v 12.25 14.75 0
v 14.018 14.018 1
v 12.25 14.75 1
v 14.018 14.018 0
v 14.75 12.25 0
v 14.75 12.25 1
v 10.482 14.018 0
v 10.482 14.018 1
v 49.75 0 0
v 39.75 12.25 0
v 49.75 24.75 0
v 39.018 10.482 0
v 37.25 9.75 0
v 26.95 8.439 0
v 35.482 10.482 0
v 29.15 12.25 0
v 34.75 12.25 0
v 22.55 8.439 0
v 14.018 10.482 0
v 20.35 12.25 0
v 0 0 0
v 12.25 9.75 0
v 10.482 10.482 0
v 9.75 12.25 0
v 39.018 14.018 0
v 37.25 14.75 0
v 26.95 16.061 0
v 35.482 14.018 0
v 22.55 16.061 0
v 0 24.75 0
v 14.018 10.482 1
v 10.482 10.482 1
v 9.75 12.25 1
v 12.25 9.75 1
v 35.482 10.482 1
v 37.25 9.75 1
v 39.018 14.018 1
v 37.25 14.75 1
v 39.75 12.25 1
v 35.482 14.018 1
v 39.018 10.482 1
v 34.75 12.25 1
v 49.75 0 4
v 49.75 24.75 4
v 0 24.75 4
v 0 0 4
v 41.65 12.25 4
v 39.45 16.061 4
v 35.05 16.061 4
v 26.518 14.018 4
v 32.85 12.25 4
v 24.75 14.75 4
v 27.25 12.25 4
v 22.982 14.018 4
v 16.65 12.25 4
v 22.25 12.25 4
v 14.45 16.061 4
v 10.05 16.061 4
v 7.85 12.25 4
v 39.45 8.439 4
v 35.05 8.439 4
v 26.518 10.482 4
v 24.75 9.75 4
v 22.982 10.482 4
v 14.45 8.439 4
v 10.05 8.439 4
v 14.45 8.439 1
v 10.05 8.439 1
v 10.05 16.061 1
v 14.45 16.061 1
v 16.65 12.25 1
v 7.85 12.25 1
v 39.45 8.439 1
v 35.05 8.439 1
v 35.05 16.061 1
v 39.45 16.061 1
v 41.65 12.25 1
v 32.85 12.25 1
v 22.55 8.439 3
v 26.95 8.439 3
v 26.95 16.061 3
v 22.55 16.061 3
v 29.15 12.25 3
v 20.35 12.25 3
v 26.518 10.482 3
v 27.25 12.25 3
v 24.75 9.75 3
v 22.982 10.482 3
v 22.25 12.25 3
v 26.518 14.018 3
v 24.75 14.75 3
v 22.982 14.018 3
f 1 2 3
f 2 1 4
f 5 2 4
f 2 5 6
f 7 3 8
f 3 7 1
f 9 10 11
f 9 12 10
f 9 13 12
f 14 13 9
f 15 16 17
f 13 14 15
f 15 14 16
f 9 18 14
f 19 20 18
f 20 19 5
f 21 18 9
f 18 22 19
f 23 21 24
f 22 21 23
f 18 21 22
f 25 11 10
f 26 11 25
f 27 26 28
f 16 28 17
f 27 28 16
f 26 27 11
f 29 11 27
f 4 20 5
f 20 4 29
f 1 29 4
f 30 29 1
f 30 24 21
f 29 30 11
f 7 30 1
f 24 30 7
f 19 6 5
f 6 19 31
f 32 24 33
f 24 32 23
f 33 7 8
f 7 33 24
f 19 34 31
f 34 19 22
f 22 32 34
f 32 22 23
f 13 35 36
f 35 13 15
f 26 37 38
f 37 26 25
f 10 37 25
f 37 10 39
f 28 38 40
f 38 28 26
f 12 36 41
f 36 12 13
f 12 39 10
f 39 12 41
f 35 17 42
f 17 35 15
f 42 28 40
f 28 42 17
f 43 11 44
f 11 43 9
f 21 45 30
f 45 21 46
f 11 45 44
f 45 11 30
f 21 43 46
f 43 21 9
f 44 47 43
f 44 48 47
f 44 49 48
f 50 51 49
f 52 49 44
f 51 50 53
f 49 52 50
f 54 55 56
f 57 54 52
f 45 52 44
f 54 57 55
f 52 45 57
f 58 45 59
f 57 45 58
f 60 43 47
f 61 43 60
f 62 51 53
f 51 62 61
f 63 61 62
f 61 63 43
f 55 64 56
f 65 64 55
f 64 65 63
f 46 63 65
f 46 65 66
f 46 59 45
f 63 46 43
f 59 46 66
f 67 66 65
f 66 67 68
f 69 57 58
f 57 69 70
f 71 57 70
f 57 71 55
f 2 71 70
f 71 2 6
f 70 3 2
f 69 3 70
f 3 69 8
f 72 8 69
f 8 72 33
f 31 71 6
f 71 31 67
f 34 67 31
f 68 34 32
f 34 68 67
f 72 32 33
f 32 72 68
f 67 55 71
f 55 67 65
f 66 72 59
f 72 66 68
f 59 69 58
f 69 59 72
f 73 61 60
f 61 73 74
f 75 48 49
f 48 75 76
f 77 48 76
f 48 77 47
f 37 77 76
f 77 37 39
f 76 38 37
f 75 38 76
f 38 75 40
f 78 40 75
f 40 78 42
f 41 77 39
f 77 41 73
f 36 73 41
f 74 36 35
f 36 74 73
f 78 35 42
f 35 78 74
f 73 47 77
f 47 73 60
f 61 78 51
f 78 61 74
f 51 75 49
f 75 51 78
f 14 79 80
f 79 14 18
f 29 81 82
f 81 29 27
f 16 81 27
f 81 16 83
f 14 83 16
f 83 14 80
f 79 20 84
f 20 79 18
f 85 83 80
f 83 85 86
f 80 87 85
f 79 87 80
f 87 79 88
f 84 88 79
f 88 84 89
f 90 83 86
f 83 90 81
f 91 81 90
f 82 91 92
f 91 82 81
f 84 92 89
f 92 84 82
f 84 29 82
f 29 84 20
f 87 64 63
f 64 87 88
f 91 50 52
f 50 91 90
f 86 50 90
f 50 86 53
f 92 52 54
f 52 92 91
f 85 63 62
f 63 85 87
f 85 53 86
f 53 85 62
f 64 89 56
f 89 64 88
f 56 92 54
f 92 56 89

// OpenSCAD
item_unit = 25;
screw_width = 4;

width_count       = 2;    // Number of items X
height_count      = 1;    // Number of items Y

tolerance         = 0.25; // 3D printing tolerance per side, mm
thickness         = 2;    // Thickness of base, mm

nut_height        = 3;    // Height of the nut, mm
leg_size          = 5;    // Leg size, mm

module plotBase(x, y, tolerance, thickness, screw_width) {
    difference() {
        cube(size = [item_unit * x - tolerance, item_unit * y - tolerance, thickness]);
        for (x_index = [0 : x - 1]) {
            for (y_index = [0 : y - 1]) {
                translate([x_index * item_unit + item_unit / 2 - tolerance, y_index * item_unit + item_unit / 2 - tolerance, 0]) {
                    cylinder(r = screw_width / 2 + tolerance * 2, h = thickness);
                }
            }
        }
    }
}

module plotM4NutSpace(x, y, z, nutHeight) {
    width = 7.8;
    translate([x, y, z + nutHeight / 2]) {
        cylinder(r = width / 2 + tolerance * 2, h = nutHeight, $fn = 6, center = true);
    }
}

module plotInvertedMount(x, y) {
    plotM4NutSpace(x, y, 0, nut_height);
    translate([x, y, thickness / 2 + thickness]) {
        cylinder(r = screw_width / 2 + tolerance * 2, h = thickness, center = true);
    }
}

difference() {
    union() {
        plotBase(width_count, height_count, tolerance, thickness, screw_width);
        translate([0, 0, thickness]) {
            cube(size = [item_unit * width_count - tolerance, item_unit * height_count - tolerance, thickness]);
        }
    }
    translate([0, 0, thickness]) {
        for (x_index = [0 : width_count - 1]) {
            for (y_index = [0 : height_count - 1]) {
                plotM4NutSpace(x_index * item_unit + item_unit / 2 - tolerance, y_index * item_unit + item_unit / 2 - tolerance, thickness - nut_height, nut_height);
            }
        }
    }
    if (width_count > 1) {
        for (x_index = [1 : width_count - 1]) {
            for (y_index = [0 : height_count - 1]) {
                plotInvertedMount(x_index * item_unit - tolerance, y_index * item_unit + item_unit / 2 - tolerance);
            }
        }
    }
    if (height_count > 1) {
        for (x_index = [0 : width_count - 1]) {
            for (y_index = [1 : height_count - 1]) {
                plotInvertedMount(x_index * item_unit + item_unit / 2 - tolerance, y_index * item_unit - tolerance);
            }
        }
    }
}
